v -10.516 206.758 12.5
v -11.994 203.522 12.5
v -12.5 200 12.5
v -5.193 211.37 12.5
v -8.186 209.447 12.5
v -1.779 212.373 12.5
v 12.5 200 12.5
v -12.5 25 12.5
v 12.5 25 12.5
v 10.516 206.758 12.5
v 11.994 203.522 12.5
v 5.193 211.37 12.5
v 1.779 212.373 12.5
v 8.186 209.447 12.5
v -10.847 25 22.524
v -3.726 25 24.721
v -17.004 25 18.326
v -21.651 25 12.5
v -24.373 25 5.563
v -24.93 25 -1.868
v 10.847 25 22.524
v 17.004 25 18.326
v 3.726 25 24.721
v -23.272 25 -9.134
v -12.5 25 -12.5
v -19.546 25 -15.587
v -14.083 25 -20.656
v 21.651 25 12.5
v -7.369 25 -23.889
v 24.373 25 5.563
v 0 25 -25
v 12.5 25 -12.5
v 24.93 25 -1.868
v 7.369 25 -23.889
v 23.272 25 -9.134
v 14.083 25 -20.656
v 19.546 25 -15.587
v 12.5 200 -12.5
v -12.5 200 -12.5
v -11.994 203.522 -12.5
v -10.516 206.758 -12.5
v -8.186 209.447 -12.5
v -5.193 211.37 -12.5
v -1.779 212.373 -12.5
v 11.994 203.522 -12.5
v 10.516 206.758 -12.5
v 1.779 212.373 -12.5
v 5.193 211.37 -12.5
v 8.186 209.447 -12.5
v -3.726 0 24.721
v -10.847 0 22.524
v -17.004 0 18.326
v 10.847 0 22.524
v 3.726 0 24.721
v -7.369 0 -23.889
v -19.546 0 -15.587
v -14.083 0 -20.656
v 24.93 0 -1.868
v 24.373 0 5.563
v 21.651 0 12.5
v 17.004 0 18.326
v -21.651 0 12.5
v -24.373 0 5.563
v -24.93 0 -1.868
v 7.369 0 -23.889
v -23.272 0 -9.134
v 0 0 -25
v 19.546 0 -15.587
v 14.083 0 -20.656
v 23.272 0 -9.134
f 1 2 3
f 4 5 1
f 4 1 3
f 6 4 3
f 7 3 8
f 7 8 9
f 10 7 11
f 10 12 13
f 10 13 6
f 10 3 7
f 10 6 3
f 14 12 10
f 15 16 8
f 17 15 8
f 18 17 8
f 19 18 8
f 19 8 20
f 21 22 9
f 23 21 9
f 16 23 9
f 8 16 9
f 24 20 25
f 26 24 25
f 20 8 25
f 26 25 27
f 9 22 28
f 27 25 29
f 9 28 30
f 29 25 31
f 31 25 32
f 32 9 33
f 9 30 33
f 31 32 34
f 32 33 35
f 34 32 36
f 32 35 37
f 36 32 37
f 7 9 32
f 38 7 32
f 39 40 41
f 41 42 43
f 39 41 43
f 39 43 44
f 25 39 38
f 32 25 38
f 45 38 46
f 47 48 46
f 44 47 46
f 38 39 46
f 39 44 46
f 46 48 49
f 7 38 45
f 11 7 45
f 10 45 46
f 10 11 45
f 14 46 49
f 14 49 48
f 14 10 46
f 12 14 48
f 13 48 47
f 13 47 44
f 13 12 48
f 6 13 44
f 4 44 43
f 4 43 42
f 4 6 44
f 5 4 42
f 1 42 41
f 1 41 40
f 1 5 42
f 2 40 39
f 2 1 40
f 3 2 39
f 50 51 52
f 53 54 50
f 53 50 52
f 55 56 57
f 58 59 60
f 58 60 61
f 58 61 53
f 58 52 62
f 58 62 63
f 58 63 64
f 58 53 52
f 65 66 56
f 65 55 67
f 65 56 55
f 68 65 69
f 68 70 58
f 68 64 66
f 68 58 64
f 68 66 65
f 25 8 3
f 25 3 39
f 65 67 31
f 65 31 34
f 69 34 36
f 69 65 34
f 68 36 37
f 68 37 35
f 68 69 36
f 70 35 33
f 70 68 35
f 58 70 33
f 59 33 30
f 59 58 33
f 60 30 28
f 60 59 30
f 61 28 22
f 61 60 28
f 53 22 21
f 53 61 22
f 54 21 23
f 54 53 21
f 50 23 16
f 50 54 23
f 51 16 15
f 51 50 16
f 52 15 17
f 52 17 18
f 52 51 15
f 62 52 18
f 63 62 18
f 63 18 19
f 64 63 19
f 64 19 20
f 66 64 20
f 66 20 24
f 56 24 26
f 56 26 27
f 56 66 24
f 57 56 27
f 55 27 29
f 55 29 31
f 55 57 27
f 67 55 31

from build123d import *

# Parameters (mm, degrees)
ESQUISSE1_W        = 25
ESQUISSE1_H        = 25
BOSS_EXTRU_1_DEPTH = 200
BOSS_EXTRU_2_DEPTH = 25
ESQUISSE3_R        = 25
BOSS_EXTRU_3_DEPTH = 25


with BuildPart() as part:
    # Esquisse1 → Boss.-Extru.1 (new body)
    with BuildSketch(Plane(origin=(0, 0, 0), x_dir=(1, 0, 0), z_dir=(0, 1, 0))):
        Rectangle(ESQUISSE1_W, ESQUISSE1_H)
    extrude(amount=BOSS_EXTRU_1_DEPTH)

    # Esquisse2 → Boss.-Extru.2 (add)
    with BuildSketch(Plane.XY.offset(12.5)):
        with BuildLine():
            Line((-12.5, 200), (12.5, 200))
            ThreePointArc((12.5, 200), (0, 212.5), (-12.5, 200))
        make_face()
    extrude(amount=-BOSS_EXTRU_2_DEPTH)

    # Esquisse3 → Boss.-Extru.3 (add)
    with BuildSketch(Plane.XZ):
        with Locations(Location((0, 0, 0), (0, 0, 270))):
            Circle(ESQUISSE3_R)
    extrude(amount=-BOSS_EXTRU_3_DEPTH)


solid = part.part
